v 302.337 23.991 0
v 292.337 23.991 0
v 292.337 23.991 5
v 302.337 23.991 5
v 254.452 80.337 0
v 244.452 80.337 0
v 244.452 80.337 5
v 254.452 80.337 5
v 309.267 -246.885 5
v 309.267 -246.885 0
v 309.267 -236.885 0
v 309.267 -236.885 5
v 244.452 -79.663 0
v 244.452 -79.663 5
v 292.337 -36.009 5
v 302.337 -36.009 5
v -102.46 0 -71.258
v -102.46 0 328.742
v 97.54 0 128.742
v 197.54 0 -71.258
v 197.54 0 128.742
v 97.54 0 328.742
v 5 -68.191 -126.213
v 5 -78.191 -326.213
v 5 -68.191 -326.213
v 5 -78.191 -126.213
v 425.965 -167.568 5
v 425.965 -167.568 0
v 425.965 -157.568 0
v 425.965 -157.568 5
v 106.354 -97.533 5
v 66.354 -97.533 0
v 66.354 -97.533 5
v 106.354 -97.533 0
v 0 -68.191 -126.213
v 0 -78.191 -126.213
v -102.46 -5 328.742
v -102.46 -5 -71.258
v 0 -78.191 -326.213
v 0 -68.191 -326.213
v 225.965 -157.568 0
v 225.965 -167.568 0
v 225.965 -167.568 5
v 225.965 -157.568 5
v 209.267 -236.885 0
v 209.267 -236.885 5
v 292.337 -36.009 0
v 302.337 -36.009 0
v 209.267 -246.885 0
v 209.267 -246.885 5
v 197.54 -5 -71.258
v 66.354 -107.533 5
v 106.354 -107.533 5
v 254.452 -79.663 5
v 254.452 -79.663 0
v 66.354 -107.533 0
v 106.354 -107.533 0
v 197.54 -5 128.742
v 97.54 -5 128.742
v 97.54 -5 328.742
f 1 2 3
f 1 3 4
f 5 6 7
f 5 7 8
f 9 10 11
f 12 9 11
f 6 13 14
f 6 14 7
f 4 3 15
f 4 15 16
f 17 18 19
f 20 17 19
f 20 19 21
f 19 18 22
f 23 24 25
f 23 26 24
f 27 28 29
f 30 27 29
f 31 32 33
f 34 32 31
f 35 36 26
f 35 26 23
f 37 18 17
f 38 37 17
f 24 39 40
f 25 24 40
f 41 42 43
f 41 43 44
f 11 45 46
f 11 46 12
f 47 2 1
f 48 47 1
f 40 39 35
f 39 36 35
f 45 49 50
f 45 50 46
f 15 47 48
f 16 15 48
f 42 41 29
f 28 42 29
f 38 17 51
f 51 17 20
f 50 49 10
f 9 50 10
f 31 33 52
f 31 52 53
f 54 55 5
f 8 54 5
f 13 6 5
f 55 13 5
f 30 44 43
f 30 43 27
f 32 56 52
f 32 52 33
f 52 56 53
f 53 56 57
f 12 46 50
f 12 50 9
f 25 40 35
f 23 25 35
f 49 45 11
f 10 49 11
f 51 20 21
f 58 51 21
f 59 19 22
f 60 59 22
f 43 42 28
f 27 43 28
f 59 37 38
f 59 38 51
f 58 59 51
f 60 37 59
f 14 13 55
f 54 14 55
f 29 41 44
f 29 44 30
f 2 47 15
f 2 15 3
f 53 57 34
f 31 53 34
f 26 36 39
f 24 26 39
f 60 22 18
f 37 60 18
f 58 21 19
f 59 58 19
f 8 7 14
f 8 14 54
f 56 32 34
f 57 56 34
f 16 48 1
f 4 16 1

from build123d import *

# Parameters (mm, degrees)
F1_DEPTH = 5
F2_W     = 200
F2_H     = 10
F2_W_2   = 100
F2_W_3   = 40
F2_W_4   = 10
F2_H_2   = 160
F2_H_3   = 60
F3_DEPTH = 5
F4_W     = 10
F4_H     = 50
F5_DEPTH = 5


with BuildPart() as f1:
    # F0 (on Front) → F1 (new body)
    with BuildSketch(Plane.XZ):
        Polygon((97.539906, 328.742468), (-102.460094, 328.742468), (-102.460094, -71.257532), (197.539906, -71.257532), (197.539906, 128.742468), (97.539906, 128.742468), align=None)
    extrude(amount=F1_DEPTH)


with BuildPart() as f3:
    # F2 (on Top) → F3 (new body)
    with BuildSketch(Plane.XY):
        with Locations((325.965008, -162.567566)):
            Rectangle(F2_W, F2_H)
        with Locations((259.266603, -241.885046)):
            Rectangle(F2_W_2, F2_H)
        with Locations((86.354267, -102.533112)):
            Rectangle(F2_W_3, F2_H)
        with Locations((249.45205, 0.337453)):
            Rectangle(F2_W_4, F2_H_2)
        with Locations((297.336941, -6.008507)):
            Rectangle(F2_W_4, F2_H_3)
    extrude(amount=F3_DEPTH)


with BuildPart() as f5:
    # F4 (on Right) → F5 (new body)
    with BuildSketch(Plane.YZ):
        with Locations((-73.19052, -301.213479)):
            Rectangle(F4_W, F4_H)
        with Locations((-73.19052, -251.213479)):
            Rectangle(F4_W, F4_H)
        with Locations((-73.19052, -201.213479)):
            Rectangle(F4_W, F4_H)
        with Locations((-73.19052, -151.213479)):
            Rectangle(F4_W, F4_H)
    extrude(amount=F5_DEPTH)


solid = Compound([f1.part, f3.part, f5.part])
